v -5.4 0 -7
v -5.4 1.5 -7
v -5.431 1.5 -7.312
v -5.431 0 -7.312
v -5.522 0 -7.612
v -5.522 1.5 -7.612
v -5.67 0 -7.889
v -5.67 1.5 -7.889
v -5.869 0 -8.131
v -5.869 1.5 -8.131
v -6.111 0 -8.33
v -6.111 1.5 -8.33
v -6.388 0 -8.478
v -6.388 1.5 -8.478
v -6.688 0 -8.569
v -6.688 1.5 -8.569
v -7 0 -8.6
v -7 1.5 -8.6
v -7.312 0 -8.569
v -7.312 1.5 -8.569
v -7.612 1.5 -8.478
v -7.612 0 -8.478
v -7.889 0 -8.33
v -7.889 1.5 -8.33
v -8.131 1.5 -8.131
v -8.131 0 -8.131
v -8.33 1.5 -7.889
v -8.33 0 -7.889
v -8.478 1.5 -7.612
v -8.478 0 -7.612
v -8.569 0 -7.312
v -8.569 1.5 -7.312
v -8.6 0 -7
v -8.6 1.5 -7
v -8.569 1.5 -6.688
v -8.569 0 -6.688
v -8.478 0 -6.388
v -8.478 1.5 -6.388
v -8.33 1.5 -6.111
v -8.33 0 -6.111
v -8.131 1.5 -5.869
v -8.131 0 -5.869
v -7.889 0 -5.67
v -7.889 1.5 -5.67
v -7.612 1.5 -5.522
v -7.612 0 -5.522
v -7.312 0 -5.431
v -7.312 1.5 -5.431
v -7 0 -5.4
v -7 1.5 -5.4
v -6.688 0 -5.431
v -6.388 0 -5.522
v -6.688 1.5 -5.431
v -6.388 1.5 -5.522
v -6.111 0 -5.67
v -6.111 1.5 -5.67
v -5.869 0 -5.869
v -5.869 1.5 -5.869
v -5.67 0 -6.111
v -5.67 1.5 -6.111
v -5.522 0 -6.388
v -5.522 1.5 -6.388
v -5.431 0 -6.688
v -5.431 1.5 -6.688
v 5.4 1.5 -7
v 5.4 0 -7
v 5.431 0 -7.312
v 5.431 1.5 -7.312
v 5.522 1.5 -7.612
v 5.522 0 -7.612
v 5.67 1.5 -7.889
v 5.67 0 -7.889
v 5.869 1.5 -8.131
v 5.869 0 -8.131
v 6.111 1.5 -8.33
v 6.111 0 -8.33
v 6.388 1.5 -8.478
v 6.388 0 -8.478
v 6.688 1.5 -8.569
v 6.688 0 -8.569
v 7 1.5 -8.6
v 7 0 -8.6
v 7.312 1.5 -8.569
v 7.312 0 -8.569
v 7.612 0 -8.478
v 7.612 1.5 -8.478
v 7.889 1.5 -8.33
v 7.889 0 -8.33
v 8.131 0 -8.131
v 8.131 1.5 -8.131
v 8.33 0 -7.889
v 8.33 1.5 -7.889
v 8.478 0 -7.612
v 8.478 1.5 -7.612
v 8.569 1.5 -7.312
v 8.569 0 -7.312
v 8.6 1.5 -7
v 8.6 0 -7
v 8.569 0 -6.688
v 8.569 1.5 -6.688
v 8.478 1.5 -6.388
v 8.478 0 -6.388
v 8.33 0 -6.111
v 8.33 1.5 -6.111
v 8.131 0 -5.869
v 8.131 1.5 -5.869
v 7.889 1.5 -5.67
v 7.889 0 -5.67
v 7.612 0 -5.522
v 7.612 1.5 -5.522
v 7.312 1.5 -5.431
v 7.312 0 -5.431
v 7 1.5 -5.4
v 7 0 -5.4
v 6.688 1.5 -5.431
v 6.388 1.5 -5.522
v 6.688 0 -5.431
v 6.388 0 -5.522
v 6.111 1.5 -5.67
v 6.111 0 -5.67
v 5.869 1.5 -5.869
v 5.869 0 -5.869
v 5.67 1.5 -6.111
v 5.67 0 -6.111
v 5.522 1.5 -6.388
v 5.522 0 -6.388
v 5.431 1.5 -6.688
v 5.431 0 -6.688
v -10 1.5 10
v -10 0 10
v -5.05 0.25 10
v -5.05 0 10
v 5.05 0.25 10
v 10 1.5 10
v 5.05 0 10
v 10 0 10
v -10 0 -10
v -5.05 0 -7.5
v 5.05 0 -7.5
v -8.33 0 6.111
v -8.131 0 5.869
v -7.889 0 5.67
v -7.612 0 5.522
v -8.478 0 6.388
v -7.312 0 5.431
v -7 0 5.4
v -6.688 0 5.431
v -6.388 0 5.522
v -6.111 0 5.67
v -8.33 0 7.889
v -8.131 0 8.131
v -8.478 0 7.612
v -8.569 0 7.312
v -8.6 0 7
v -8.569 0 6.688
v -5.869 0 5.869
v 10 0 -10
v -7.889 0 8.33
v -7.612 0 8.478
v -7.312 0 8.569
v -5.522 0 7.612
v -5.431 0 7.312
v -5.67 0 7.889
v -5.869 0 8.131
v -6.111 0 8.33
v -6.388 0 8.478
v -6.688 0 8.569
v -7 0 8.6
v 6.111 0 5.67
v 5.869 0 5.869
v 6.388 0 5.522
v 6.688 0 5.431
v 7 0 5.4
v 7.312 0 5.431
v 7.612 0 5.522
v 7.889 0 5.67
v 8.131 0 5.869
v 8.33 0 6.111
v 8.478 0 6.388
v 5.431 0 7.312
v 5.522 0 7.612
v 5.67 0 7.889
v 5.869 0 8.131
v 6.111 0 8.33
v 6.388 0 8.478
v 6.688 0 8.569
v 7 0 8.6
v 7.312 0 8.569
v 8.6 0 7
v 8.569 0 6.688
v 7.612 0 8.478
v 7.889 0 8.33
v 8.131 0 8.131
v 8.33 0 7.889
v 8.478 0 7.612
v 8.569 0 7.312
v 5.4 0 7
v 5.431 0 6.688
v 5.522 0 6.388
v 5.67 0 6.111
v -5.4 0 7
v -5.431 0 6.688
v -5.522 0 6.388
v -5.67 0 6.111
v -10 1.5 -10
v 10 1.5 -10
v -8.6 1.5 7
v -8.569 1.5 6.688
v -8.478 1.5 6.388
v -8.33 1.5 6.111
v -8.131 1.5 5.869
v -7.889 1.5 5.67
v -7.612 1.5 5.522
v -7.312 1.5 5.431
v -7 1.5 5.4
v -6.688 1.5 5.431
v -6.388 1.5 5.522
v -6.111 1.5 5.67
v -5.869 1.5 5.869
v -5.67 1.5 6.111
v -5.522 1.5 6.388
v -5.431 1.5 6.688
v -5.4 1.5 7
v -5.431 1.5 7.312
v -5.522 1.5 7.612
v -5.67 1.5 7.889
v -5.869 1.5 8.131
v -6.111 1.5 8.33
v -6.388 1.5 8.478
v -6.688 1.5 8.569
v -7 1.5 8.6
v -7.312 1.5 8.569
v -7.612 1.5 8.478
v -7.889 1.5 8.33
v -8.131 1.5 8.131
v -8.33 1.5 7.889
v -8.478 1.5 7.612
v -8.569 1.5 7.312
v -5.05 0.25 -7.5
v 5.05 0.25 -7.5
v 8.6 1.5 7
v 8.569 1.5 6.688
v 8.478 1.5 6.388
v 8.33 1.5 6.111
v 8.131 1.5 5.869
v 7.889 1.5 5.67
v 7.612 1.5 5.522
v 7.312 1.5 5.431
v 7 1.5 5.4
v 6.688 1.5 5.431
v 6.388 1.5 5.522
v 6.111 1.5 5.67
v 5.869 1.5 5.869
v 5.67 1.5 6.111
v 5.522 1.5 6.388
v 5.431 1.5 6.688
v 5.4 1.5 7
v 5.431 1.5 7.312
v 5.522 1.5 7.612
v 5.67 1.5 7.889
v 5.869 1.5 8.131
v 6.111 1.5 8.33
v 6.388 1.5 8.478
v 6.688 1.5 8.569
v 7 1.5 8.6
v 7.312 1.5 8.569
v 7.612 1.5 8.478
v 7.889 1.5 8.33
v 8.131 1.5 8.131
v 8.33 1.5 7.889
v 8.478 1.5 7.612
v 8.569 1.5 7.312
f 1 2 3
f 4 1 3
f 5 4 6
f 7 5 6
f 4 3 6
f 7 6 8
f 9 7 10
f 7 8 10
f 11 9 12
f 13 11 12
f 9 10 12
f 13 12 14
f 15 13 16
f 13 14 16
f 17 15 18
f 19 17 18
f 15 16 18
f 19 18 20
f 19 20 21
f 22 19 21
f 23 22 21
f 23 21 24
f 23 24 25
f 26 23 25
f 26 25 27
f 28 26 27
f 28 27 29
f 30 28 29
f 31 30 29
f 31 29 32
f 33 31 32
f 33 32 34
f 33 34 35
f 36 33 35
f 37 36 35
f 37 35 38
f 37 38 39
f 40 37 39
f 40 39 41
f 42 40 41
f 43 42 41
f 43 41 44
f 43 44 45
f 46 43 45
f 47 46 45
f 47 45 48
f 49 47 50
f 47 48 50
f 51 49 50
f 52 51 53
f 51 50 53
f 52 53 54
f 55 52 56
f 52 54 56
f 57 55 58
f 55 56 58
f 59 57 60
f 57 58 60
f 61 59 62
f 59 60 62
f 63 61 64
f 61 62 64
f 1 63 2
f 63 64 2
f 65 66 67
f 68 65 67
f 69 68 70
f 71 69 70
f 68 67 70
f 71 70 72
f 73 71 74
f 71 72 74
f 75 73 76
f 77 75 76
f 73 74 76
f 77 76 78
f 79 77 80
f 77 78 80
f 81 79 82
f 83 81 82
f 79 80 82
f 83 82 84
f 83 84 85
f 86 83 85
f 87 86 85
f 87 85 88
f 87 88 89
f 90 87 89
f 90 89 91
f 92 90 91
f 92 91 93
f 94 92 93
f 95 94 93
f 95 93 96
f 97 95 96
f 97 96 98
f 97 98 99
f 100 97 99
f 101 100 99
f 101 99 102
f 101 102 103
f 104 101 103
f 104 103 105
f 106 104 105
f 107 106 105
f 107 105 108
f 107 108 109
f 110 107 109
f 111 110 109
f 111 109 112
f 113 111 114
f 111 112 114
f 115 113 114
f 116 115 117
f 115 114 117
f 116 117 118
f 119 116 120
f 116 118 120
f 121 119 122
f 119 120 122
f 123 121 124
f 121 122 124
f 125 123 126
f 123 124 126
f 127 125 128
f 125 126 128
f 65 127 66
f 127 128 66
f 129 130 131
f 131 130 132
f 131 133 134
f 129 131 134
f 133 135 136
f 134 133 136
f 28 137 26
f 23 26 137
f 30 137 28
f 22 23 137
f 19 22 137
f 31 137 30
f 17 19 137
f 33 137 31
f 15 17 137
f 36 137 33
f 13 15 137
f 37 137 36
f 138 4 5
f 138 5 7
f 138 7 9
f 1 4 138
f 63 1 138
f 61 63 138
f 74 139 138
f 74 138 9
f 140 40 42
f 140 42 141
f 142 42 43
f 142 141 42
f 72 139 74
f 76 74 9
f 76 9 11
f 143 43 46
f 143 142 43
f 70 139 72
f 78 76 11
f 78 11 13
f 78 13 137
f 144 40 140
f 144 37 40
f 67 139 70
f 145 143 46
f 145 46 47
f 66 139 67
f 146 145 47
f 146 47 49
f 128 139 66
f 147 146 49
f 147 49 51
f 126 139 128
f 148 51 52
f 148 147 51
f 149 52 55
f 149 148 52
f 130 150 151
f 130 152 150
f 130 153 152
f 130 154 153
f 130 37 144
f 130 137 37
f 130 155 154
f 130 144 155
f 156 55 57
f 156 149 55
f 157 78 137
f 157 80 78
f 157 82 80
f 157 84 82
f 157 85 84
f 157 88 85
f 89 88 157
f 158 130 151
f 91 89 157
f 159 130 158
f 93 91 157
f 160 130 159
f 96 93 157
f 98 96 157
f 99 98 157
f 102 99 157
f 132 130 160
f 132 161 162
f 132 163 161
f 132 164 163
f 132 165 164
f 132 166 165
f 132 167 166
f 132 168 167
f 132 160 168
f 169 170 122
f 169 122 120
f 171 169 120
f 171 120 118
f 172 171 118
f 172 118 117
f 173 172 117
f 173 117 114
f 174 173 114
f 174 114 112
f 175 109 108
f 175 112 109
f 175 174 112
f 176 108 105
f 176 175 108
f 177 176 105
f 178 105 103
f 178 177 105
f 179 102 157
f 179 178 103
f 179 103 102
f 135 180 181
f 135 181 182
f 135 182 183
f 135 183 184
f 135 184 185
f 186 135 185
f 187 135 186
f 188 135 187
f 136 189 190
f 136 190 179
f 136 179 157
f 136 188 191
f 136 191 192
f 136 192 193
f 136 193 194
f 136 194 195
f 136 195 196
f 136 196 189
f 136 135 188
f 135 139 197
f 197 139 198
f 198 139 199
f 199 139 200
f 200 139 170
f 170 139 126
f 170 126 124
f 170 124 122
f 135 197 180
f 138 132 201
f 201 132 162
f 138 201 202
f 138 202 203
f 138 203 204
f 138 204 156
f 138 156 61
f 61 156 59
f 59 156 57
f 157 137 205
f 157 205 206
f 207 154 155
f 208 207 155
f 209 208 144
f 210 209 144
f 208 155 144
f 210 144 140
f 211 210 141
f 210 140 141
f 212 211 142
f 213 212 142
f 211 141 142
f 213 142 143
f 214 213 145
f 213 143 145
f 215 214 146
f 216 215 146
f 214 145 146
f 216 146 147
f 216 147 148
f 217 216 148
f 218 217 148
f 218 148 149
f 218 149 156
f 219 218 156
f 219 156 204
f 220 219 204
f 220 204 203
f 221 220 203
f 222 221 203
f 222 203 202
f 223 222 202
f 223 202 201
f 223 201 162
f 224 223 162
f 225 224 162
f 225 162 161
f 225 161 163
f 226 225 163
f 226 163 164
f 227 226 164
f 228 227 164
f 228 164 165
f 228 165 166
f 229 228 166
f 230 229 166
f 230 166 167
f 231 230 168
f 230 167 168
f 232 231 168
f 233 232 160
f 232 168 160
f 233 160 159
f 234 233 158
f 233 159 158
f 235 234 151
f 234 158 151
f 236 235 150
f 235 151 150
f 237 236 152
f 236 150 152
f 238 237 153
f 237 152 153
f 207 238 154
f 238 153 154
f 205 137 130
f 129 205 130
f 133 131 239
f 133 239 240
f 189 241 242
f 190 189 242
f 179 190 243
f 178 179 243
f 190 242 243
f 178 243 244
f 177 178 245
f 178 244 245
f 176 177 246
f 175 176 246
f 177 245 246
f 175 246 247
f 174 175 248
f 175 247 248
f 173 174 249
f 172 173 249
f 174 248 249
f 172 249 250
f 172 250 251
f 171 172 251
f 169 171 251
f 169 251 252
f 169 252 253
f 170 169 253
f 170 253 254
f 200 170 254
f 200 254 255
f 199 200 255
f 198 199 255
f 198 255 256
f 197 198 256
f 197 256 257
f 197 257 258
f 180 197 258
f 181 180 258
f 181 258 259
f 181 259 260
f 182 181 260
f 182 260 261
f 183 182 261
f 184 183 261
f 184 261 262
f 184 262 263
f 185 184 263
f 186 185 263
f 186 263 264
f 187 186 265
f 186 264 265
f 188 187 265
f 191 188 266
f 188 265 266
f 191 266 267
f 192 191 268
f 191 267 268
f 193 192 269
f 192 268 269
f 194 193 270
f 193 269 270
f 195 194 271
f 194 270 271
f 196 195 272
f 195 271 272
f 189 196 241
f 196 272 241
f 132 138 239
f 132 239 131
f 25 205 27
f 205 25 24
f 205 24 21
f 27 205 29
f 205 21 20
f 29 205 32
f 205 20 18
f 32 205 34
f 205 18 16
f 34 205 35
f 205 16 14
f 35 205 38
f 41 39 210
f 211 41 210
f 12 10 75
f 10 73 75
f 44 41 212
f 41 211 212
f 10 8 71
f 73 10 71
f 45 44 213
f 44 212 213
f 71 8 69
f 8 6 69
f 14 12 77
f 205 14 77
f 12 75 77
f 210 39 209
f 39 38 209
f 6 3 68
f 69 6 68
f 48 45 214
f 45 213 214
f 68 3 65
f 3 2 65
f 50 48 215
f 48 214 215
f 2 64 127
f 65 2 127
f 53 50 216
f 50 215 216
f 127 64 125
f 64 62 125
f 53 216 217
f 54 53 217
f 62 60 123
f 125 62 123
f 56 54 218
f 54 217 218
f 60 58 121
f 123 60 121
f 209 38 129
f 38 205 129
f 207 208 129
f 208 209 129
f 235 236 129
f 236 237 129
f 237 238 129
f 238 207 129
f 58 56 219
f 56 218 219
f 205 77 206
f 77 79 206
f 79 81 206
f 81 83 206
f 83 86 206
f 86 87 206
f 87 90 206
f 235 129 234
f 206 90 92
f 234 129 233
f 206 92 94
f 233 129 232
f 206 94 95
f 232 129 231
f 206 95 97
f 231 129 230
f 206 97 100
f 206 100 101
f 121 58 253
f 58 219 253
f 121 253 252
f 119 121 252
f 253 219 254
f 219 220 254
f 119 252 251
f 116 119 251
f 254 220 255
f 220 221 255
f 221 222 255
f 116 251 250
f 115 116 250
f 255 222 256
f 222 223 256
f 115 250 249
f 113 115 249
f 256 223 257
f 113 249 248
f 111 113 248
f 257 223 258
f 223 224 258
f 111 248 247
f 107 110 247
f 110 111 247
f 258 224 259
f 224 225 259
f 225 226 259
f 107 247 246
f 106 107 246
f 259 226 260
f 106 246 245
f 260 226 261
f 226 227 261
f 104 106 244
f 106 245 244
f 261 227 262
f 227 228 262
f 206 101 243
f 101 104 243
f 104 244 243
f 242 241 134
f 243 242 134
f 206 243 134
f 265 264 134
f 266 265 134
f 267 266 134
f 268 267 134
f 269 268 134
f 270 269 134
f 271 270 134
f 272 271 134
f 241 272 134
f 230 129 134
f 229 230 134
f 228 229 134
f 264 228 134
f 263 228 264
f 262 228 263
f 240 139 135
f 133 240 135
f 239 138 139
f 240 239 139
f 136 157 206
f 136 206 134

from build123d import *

# Parameters (mm, degrees)
SKETCH_1_W              = 20
SKETCH_1_H              = 20
EXTRUDE_1_DEPTH         = 1.5
SKETCH_2_W              = 10.1
SKETCH_2_H              = 17.5
CUT_EXTRUDE_1_DEPTH     = 0.25
HOLE_WIZARD_3_2_3_2_1_D = 3.2
HOLE_WIZARD_3_2_3_2_2_D = 3.2


with BuildPart() as part:
    # 草图1 → 凸台-拉伸1 (new body)
    with BuildSketch(Plane.XZ):
        Rectangle(SKETCH_1_W, SKETCH_1_H)
    extrude(amount=-EXTRUDE_1_DEPTH)

    # 草图2 → 切除-拉伸1 (cut)
    with BuildSketch(Plane.XZ):
        with Locations((0, 1.25)):
            Rectangle(SKETCH_2_W, SKETCH_2_H)
    extrude(amount=-CUT_EXTRUDE_1_DEPTH, mode=Mode.SUBTRACT)

    # Ø3.2 (3.2) 直径孔1 (through all)
    with Locations(Plane(origin=(0, 1.5, 0), x_dir=(1, 0, 0), z_dir=(0, 1, 0))):
        with Locations((-7, -7), (7, 7)):
            Hole(HOLE_WIZARD_3_2_3_2_1_D / 2)

    # Ø3.2 (3.2) 直径孔2 (through all)
    with Locations(Plane(origin=(0, 0, 0), x_dir=(-1, 0, 0), z_dir=(0, -1, 0))):
        with Locations((-7, -7), (7, 7)):
            Hole(HOLE_WIZARD_3_2_3_2_2_D / 2)


solid = part.part
